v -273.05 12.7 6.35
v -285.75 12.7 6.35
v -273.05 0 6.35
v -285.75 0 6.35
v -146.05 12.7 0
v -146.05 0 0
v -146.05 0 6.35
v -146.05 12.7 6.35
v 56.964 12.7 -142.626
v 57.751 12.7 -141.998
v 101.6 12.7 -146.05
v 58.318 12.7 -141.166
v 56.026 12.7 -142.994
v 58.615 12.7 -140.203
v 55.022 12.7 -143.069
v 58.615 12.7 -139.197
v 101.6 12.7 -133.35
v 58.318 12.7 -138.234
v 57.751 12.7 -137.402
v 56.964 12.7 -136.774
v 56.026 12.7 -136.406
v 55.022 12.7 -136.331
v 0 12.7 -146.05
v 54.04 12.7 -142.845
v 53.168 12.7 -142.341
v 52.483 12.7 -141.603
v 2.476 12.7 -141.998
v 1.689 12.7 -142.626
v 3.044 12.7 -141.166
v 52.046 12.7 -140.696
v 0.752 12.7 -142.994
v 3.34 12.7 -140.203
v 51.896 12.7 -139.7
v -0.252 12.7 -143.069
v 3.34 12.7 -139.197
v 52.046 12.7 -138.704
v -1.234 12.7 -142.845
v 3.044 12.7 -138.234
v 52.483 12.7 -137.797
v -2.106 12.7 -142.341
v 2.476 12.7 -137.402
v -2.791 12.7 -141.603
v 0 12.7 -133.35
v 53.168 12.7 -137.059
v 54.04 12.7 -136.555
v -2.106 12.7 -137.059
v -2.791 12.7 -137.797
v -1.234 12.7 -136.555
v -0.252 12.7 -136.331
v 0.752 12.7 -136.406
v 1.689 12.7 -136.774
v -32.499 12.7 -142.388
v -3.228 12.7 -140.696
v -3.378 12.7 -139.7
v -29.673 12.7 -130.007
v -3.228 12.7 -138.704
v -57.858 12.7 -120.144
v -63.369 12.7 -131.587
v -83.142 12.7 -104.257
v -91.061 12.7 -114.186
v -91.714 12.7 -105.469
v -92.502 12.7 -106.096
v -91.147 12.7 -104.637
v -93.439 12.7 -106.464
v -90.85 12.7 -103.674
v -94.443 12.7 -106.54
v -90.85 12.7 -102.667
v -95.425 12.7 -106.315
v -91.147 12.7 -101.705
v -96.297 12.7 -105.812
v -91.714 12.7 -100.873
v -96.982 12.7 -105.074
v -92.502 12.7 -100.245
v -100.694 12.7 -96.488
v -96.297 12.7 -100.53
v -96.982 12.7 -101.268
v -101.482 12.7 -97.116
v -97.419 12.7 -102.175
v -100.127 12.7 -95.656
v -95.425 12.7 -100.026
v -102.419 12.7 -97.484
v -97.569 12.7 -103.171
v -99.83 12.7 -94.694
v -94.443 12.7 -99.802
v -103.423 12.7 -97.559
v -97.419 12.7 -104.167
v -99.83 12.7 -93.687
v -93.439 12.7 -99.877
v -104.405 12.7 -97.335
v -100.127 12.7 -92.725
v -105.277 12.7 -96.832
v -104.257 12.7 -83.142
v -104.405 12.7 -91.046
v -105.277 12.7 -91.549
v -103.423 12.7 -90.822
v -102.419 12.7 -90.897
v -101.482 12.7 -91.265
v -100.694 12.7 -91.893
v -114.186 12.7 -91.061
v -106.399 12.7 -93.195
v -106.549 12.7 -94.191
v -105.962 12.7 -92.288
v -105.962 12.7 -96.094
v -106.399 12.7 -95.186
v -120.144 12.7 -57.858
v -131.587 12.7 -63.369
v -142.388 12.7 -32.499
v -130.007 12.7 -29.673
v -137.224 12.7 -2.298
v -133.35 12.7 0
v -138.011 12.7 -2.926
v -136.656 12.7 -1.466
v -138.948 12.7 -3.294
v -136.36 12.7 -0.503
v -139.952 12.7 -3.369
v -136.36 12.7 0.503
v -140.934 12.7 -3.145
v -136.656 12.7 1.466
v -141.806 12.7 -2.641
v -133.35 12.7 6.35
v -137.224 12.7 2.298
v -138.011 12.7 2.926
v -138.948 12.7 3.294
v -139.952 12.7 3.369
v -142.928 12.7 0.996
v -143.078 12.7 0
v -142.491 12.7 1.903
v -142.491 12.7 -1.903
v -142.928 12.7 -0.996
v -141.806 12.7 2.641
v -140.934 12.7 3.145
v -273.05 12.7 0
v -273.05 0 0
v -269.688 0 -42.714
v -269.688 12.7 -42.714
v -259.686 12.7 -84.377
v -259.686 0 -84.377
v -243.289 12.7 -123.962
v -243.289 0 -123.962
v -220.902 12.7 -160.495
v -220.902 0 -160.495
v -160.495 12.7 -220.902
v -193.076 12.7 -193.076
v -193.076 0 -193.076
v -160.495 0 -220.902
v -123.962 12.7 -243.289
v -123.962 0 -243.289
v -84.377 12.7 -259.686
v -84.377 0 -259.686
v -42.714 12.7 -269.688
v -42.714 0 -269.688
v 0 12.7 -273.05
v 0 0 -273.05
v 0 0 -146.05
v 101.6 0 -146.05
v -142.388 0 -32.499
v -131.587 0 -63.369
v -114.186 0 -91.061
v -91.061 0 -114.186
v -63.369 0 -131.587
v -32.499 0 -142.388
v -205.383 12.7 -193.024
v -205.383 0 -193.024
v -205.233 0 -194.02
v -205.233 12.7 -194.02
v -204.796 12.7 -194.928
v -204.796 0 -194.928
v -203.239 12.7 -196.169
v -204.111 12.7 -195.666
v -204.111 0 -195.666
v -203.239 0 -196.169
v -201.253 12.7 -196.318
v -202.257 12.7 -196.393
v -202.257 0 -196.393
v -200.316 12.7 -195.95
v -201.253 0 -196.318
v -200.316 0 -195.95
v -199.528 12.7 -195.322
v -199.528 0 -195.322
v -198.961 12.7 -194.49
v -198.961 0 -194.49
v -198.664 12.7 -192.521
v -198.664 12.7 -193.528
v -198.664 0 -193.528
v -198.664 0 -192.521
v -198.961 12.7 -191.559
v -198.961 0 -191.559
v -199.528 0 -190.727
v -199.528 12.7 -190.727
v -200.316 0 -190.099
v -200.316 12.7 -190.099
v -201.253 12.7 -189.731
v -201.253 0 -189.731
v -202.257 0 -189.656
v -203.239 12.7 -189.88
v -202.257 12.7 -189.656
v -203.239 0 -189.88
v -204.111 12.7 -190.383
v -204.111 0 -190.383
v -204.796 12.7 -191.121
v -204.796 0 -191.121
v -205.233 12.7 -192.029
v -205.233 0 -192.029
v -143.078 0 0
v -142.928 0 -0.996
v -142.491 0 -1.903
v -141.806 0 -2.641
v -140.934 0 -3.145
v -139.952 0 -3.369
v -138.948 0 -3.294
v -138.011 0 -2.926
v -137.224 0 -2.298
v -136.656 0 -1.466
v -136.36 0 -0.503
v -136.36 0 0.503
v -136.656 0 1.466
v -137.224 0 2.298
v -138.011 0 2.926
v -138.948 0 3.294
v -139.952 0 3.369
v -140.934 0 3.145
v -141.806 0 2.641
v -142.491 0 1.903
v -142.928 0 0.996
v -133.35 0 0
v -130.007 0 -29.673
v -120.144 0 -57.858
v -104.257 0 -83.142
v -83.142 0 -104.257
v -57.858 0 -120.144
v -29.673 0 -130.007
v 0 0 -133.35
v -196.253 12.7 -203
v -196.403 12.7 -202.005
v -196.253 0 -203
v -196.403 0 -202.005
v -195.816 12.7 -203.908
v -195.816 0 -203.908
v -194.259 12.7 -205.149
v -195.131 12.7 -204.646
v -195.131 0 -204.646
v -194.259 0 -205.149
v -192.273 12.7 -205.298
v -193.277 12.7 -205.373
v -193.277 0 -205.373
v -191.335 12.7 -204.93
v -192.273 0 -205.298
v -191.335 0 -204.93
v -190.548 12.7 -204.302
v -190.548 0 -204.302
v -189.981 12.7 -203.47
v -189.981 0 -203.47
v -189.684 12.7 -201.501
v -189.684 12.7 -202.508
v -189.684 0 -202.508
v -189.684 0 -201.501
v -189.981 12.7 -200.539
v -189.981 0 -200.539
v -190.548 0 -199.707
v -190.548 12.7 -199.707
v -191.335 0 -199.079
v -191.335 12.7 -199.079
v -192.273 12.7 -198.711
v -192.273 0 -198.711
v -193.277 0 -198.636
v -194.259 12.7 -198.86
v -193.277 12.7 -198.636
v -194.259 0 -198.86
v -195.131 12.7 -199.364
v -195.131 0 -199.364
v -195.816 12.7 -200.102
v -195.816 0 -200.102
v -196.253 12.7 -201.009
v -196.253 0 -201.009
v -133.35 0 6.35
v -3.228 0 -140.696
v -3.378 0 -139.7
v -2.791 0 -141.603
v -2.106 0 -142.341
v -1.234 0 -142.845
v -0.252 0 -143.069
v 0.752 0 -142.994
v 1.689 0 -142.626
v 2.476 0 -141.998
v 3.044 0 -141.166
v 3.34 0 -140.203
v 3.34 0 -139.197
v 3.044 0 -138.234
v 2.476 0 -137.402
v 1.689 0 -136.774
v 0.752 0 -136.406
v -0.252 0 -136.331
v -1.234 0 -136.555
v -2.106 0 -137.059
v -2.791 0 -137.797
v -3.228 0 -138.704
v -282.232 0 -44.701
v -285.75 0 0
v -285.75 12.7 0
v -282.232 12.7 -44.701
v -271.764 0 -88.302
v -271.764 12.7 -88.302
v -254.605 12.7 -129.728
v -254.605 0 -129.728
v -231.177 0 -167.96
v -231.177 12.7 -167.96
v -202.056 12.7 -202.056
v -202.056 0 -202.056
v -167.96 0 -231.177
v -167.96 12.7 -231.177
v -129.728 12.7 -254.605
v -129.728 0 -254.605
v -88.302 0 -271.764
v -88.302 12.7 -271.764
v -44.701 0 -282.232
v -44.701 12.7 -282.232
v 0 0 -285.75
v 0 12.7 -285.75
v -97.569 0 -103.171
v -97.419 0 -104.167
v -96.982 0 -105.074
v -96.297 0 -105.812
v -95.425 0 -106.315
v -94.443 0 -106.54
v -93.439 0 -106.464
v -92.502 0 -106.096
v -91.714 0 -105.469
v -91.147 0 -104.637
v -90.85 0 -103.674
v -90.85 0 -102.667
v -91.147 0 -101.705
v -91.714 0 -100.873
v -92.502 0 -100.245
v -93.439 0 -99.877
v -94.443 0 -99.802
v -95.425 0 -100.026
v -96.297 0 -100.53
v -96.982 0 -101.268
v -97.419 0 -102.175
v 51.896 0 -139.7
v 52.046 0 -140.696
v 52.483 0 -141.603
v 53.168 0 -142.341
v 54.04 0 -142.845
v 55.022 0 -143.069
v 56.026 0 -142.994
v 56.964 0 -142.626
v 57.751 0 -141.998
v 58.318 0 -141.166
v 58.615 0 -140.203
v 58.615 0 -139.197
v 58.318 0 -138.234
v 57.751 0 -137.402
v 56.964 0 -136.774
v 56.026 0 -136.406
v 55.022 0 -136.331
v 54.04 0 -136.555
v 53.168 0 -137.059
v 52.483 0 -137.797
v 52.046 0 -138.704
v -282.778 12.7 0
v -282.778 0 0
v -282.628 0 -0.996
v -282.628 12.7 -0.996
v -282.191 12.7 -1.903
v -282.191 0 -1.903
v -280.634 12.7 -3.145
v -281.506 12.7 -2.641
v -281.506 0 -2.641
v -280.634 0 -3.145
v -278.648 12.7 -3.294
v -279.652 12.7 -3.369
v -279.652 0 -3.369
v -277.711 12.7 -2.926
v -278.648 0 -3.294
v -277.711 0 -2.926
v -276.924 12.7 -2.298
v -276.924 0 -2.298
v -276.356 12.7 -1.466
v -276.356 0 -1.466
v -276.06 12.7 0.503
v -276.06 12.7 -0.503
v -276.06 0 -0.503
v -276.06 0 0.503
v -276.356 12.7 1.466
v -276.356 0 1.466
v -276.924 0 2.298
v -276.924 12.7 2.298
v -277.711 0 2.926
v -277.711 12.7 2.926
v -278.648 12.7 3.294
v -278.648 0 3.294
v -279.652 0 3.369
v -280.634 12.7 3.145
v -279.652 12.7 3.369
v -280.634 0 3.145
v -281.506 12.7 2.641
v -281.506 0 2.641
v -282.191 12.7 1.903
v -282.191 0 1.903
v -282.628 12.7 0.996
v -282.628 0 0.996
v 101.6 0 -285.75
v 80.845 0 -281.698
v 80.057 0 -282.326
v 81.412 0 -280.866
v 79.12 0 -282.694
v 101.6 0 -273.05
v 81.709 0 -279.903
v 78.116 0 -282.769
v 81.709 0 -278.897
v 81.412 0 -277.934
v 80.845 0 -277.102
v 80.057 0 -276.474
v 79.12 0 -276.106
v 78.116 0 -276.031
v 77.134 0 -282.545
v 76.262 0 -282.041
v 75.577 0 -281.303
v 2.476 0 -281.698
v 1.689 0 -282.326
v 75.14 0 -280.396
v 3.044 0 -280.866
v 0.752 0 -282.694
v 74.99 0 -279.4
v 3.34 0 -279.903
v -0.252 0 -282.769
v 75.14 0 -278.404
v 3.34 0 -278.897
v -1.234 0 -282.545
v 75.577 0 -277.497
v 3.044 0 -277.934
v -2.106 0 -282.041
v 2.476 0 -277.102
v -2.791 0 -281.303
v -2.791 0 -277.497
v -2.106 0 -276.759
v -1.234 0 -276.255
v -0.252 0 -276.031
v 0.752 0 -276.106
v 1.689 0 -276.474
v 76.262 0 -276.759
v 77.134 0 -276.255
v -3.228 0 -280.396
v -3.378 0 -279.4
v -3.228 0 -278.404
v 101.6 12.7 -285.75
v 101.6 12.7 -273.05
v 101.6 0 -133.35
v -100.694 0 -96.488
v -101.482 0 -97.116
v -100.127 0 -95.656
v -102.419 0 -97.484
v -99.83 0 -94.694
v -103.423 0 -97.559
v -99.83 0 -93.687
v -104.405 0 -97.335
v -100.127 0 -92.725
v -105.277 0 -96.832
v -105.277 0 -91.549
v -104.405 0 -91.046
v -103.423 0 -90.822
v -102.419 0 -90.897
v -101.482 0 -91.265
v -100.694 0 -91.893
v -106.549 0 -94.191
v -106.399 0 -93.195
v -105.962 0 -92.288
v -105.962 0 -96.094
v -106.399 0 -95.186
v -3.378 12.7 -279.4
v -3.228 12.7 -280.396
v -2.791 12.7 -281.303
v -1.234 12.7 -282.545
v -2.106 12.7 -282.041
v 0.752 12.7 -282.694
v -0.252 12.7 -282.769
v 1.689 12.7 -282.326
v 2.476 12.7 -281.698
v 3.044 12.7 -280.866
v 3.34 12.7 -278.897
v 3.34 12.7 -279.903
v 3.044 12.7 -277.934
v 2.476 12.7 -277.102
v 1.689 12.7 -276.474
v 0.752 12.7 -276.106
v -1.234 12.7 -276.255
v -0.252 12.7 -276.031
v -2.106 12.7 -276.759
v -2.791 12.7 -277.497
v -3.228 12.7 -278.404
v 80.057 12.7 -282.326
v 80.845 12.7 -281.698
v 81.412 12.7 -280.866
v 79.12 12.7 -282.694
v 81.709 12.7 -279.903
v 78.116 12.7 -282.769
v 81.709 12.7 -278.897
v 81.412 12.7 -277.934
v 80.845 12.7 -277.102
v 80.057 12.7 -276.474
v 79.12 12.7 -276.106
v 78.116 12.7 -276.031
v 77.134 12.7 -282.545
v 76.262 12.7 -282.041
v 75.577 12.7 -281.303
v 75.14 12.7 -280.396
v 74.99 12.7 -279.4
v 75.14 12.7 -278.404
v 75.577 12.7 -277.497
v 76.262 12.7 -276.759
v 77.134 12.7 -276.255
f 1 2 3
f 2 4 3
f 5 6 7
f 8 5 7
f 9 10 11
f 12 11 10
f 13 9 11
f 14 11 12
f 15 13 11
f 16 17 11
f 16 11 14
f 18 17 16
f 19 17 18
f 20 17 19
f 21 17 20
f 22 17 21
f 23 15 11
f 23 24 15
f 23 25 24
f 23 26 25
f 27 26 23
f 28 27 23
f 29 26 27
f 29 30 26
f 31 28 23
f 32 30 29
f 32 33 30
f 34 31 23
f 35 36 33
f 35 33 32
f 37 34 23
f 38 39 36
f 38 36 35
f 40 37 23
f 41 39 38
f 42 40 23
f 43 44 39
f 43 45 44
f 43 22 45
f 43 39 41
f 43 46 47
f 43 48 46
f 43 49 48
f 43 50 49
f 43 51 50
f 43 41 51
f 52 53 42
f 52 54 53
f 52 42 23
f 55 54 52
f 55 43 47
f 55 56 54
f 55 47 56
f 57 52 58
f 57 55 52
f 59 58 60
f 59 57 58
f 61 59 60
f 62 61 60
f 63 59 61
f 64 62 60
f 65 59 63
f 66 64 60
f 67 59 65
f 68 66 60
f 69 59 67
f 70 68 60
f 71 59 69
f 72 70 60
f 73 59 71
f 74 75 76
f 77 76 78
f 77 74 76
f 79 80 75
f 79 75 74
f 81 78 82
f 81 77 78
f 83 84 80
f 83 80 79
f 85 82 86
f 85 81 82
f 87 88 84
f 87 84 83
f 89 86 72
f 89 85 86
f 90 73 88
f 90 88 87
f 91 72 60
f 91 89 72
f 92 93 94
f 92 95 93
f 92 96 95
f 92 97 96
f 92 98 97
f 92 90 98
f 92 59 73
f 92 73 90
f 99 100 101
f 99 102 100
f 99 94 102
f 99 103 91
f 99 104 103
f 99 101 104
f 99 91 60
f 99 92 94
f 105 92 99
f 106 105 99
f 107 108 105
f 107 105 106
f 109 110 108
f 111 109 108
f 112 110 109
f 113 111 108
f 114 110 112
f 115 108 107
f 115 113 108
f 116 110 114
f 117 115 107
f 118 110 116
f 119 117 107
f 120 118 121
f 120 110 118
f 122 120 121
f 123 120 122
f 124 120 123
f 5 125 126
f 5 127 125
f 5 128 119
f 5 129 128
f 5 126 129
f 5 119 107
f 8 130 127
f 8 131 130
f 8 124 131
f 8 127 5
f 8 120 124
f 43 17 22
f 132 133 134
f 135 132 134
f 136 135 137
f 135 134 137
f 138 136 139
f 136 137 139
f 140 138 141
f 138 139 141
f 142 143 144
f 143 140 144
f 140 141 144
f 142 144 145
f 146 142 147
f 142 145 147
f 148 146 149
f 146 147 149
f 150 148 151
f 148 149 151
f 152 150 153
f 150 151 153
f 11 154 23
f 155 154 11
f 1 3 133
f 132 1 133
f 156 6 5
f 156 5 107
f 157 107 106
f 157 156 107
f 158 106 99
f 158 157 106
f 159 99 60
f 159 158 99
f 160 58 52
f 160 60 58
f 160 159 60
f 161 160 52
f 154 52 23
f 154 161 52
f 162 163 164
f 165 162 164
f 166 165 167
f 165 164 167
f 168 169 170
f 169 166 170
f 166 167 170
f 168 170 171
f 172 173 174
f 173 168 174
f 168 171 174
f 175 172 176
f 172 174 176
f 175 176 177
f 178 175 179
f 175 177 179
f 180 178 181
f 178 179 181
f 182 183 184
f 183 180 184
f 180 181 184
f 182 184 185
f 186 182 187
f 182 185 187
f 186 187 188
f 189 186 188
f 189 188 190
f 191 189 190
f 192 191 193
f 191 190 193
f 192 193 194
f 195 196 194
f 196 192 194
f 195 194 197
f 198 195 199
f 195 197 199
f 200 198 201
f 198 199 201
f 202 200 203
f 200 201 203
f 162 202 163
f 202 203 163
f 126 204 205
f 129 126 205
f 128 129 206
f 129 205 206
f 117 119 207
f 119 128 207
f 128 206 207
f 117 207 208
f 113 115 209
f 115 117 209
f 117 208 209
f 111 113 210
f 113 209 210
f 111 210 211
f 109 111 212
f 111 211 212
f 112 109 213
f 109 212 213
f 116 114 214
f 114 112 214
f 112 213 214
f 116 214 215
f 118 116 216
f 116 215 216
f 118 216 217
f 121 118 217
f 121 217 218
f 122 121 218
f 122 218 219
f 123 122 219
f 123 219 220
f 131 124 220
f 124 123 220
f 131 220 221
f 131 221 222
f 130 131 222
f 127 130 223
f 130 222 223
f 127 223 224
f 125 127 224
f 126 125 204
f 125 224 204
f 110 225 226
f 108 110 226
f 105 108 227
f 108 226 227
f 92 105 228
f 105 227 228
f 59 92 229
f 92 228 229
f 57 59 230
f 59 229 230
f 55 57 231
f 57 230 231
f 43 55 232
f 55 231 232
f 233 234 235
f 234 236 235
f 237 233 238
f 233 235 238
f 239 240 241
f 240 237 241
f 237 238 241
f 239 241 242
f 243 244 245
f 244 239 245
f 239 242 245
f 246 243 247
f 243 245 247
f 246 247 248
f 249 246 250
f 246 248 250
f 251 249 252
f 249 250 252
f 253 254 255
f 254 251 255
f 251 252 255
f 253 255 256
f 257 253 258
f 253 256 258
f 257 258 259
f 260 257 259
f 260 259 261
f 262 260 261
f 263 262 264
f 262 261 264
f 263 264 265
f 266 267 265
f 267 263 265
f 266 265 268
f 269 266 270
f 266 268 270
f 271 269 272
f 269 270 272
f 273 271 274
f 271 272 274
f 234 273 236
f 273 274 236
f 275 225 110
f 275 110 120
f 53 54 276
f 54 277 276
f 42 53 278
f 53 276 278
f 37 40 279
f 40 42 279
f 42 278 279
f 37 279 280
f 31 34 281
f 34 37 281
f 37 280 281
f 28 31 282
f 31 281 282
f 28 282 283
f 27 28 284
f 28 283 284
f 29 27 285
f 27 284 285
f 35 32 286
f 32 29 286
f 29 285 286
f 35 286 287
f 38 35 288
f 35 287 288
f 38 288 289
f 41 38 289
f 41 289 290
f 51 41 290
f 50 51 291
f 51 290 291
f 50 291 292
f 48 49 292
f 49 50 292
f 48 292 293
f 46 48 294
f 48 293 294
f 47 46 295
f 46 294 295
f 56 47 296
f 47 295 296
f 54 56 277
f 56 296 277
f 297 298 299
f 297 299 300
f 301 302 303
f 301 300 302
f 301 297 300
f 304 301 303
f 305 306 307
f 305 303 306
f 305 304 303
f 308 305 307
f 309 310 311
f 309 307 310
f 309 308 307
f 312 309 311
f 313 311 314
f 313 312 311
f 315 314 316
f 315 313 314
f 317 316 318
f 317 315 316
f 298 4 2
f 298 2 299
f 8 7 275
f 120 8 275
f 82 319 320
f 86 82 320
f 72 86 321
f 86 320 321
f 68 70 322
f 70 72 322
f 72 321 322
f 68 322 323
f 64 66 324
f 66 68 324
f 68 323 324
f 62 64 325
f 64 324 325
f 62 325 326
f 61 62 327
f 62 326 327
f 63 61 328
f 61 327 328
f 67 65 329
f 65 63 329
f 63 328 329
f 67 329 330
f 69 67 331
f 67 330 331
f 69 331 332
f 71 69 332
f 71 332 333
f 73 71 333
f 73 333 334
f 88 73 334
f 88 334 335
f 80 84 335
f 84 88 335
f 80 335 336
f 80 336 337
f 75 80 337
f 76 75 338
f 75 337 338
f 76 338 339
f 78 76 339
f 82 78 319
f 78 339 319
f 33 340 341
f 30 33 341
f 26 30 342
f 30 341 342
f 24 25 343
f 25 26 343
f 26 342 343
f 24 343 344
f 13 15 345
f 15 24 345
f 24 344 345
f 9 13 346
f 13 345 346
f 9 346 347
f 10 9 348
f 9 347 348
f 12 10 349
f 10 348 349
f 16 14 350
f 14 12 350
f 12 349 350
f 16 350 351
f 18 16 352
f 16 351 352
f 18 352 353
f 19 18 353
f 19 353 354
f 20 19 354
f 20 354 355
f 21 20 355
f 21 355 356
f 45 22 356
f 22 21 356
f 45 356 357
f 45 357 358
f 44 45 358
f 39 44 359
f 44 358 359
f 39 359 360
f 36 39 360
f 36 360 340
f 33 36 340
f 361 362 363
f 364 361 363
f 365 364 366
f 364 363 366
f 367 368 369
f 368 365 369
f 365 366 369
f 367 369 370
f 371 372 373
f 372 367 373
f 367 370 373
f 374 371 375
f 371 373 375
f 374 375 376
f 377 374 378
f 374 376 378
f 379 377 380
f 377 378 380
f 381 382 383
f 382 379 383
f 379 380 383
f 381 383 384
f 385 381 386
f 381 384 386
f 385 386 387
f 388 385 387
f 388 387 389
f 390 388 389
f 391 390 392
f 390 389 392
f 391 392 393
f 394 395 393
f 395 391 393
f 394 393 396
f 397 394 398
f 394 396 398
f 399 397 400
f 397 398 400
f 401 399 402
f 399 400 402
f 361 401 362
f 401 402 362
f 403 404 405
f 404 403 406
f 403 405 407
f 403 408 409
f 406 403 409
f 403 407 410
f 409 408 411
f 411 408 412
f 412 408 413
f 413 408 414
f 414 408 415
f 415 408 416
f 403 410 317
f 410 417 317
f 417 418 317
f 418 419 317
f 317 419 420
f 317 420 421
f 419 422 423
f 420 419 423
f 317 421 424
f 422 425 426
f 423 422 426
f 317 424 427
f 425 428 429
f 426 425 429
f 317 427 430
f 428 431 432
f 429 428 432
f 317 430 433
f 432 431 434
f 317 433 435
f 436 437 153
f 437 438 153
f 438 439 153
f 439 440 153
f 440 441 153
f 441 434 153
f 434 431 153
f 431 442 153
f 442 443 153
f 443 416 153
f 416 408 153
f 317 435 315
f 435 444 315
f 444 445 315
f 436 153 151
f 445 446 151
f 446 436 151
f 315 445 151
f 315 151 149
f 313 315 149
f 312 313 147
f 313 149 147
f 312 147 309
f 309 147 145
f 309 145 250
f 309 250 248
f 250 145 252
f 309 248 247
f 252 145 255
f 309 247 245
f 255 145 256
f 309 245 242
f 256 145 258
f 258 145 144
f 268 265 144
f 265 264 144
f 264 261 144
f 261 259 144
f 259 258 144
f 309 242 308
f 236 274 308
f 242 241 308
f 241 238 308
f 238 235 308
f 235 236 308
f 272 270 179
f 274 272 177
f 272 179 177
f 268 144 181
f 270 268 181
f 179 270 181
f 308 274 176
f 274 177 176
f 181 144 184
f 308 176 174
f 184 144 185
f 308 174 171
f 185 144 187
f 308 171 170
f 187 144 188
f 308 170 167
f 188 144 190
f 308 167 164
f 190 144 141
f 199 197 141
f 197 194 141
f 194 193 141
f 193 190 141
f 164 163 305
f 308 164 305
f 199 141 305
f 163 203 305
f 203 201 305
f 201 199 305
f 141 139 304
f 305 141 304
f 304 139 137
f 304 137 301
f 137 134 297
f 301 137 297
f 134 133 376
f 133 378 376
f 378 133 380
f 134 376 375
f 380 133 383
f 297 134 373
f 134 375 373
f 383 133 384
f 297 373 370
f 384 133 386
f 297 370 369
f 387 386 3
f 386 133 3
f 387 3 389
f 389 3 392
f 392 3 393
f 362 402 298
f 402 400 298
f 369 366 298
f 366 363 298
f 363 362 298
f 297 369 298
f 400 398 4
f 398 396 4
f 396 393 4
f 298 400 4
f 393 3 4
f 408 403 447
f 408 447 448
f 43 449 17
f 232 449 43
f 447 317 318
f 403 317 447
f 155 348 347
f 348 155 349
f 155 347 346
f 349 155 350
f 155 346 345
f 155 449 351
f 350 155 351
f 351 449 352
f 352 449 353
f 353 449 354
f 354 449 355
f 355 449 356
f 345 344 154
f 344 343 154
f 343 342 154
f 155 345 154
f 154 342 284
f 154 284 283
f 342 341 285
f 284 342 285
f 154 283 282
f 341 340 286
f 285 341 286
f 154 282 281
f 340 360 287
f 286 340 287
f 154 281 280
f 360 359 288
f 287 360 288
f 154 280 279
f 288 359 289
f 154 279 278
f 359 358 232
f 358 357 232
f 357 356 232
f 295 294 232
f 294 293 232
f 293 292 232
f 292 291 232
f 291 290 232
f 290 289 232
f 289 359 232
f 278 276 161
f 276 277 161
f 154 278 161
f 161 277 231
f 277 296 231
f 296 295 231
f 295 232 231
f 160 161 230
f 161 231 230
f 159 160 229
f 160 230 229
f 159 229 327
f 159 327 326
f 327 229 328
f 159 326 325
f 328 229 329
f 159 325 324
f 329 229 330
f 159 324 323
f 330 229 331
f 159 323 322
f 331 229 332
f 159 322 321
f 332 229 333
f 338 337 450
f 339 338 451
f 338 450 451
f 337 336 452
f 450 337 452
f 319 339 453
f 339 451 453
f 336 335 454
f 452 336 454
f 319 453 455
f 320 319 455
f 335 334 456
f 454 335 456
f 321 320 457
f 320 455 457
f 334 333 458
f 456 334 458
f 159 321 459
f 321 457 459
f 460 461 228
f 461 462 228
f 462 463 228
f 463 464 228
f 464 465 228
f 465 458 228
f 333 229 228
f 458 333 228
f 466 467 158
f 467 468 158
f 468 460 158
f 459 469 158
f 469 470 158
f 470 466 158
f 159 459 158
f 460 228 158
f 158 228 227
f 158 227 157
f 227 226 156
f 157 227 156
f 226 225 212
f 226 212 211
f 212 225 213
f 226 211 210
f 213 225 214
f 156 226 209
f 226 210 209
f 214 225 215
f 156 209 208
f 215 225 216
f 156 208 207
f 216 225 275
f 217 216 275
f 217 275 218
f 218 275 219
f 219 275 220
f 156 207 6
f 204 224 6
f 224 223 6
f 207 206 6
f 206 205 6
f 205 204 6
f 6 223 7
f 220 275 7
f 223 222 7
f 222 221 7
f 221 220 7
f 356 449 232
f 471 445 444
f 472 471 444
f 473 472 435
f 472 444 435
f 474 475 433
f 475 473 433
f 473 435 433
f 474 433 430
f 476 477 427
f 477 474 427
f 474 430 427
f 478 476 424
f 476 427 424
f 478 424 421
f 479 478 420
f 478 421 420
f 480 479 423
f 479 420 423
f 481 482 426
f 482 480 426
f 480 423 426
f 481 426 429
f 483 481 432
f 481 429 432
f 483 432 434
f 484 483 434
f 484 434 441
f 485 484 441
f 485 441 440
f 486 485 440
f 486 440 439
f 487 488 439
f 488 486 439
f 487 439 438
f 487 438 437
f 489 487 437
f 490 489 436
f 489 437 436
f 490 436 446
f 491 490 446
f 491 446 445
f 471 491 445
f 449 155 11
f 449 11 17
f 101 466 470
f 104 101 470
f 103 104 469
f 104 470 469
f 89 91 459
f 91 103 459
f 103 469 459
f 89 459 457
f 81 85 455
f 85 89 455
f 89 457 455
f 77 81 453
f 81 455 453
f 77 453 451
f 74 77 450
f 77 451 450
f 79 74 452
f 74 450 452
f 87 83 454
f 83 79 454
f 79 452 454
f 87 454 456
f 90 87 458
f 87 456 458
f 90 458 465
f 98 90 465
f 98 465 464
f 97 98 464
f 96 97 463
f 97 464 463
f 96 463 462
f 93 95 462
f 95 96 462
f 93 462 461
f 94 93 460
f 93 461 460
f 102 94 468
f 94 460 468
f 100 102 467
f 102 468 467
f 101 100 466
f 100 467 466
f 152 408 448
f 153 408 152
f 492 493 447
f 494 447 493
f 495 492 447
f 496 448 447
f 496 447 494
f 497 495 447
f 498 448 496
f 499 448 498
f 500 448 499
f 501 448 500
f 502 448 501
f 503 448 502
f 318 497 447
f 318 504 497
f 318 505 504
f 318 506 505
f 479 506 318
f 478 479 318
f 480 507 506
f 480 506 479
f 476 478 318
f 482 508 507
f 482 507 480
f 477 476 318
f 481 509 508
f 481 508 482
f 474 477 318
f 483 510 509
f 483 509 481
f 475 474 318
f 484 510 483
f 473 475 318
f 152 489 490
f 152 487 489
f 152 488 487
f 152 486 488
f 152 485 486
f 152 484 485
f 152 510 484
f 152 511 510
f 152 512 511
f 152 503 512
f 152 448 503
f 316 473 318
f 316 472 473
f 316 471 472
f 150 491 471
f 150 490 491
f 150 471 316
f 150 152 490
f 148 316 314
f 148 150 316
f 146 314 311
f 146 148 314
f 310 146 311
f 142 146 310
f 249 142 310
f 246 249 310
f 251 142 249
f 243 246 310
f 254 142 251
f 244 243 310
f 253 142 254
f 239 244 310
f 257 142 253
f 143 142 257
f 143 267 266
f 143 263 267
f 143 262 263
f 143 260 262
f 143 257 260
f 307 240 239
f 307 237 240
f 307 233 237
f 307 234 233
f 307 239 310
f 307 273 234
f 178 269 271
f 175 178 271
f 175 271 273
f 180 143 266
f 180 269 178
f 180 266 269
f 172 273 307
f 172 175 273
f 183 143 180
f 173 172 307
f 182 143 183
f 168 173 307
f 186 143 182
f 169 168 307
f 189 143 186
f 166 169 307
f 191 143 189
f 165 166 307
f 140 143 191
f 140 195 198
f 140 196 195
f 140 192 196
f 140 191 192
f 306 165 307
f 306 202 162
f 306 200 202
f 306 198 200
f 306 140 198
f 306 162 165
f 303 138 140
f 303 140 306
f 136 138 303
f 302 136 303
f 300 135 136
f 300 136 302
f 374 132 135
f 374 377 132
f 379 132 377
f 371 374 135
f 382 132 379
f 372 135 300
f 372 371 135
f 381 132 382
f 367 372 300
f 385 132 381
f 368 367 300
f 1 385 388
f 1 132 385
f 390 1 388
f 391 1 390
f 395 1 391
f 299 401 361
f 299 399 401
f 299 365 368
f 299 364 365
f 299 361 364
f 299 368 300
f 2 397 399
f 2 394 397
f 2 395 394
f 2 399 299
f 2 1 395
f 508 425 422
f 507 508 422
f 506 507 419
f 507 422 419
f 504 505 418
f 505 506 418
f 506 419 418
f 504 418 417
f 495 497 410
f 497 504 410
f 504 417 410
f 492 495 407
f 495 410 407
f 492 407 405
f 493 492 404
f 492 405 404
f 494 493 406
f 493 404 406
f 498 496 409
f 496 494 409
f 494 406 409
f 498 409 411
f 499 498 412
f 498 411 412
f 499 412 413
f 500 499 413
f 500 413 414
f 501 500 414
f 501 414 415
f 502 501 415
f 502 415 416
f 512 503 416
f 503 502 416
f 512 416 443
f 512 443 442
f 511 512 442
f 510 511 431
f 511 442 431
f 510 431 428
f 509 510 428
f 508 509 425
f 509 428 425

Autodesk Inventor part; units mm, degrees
ref_plane "YZ Plane" through (0, 0, 0) normal (1, 0, 0) x (0, 1, 0)
ref_plane "XZ Plane" through (0, 0, 0) normal (0, 1, 0) x (-1, 0, 0)
ref_plane "XY Plane" through (0, 0, 0) normal (0, 0, 1) x (1, 0, 0)
sketch "Sketch1" plane through (0, 0, 0) normal (0, 1, 0) x (-1, 0, 0)
  arc A0 (0, -273.05) -> (273.05, 0) centre (0, 0) ccw
  arc A1 (0, -285.75) -> (285.75, 0) centre (0, 0) ccw
  line L0 (-101.6, -133.35) -> (0, -133.35)
  line L1 (-101.6, -146.05) -> (-101.6, -133.35)
  line L2 (0, -146.05) -> (-101.6, -146.05)
  arc A2 (0, -146.05) -> (146.05, 0) centre (0, 0) ccw
  arc A3 (0, -133.35) -> (133.35, 0) centre (0, 0) ccw
  line L3 (-101.6, -273.05) -> (0, -273.05)
  line L4 (0, -285.75) -> (-101.6, -285.75)
  line L5 (146.05, 0) -> (146.05, 6.35)
  line L6 (133.35, 0) -> (133.35, 6.35)
  line L7 (273.05, 6.35) -> (273.05, 0)
  line L8 (285.75, 6.35) -> (285.75, 0)
  line L9 (-101.6, -285.75) -> (-101.6, -273.05)
  circle A4 centre (103.1708, -94.1906) radius 3.3782
  circle A5 centre (94.1906, -103.1708) radius 3.3782
  circle A6 centre (279.4, 0) radius 3.3782
  circle A7 centre (139.7, 0) radius 3.3782
  circle A8 centre (202.0047, -193.0245) radius 3.3782
  circle A9 centre (193.0245, -202.0047) radius 3.3782
  circle A10 centre (0, -279.4) radius 3.3782
  circle A11 centre (0, -139.7) radius 3.3782
  circle A12 centre (-55.2746, -139.7) radius 3.3782
  circle A13 centre (-78.3684, -279.4) radius 3.3782
  line L10 (285.75, 6.35) -> (273.05, 6.35)
  line L11 (146.05, 6.35) -> (133.35, 6.35)
  dimension "d10" = 12.7
  dimension "d11" = 12.7
  dimension "d13" = 12.7
  dimension "d14" = 6.7564
  dimension "d15" = 6.7564
  dimension "d16" = 6.7564
  dimension "d18" = 6.7564
  dimension "d20" = 6.35
  dimension "d21" = 6.7564
  dimension "d22" = 6.7564
  dimension "d23" = 6.7564
  dimension "d24" = 6.35
  dimension "d26" = 6.7564
  dimension "d27" = 6.35
  dimension "d30" = 6.7564
  dimension "d31" = 6.35
  dimension "d32" = 6.7564
  dimension "d33" = 6.35
extrude "Extrusion1" add sketch "Sketch1" along normal blind 12.7
properties part number "Runner Rails v1" material "Polycarbonate, Clear"
